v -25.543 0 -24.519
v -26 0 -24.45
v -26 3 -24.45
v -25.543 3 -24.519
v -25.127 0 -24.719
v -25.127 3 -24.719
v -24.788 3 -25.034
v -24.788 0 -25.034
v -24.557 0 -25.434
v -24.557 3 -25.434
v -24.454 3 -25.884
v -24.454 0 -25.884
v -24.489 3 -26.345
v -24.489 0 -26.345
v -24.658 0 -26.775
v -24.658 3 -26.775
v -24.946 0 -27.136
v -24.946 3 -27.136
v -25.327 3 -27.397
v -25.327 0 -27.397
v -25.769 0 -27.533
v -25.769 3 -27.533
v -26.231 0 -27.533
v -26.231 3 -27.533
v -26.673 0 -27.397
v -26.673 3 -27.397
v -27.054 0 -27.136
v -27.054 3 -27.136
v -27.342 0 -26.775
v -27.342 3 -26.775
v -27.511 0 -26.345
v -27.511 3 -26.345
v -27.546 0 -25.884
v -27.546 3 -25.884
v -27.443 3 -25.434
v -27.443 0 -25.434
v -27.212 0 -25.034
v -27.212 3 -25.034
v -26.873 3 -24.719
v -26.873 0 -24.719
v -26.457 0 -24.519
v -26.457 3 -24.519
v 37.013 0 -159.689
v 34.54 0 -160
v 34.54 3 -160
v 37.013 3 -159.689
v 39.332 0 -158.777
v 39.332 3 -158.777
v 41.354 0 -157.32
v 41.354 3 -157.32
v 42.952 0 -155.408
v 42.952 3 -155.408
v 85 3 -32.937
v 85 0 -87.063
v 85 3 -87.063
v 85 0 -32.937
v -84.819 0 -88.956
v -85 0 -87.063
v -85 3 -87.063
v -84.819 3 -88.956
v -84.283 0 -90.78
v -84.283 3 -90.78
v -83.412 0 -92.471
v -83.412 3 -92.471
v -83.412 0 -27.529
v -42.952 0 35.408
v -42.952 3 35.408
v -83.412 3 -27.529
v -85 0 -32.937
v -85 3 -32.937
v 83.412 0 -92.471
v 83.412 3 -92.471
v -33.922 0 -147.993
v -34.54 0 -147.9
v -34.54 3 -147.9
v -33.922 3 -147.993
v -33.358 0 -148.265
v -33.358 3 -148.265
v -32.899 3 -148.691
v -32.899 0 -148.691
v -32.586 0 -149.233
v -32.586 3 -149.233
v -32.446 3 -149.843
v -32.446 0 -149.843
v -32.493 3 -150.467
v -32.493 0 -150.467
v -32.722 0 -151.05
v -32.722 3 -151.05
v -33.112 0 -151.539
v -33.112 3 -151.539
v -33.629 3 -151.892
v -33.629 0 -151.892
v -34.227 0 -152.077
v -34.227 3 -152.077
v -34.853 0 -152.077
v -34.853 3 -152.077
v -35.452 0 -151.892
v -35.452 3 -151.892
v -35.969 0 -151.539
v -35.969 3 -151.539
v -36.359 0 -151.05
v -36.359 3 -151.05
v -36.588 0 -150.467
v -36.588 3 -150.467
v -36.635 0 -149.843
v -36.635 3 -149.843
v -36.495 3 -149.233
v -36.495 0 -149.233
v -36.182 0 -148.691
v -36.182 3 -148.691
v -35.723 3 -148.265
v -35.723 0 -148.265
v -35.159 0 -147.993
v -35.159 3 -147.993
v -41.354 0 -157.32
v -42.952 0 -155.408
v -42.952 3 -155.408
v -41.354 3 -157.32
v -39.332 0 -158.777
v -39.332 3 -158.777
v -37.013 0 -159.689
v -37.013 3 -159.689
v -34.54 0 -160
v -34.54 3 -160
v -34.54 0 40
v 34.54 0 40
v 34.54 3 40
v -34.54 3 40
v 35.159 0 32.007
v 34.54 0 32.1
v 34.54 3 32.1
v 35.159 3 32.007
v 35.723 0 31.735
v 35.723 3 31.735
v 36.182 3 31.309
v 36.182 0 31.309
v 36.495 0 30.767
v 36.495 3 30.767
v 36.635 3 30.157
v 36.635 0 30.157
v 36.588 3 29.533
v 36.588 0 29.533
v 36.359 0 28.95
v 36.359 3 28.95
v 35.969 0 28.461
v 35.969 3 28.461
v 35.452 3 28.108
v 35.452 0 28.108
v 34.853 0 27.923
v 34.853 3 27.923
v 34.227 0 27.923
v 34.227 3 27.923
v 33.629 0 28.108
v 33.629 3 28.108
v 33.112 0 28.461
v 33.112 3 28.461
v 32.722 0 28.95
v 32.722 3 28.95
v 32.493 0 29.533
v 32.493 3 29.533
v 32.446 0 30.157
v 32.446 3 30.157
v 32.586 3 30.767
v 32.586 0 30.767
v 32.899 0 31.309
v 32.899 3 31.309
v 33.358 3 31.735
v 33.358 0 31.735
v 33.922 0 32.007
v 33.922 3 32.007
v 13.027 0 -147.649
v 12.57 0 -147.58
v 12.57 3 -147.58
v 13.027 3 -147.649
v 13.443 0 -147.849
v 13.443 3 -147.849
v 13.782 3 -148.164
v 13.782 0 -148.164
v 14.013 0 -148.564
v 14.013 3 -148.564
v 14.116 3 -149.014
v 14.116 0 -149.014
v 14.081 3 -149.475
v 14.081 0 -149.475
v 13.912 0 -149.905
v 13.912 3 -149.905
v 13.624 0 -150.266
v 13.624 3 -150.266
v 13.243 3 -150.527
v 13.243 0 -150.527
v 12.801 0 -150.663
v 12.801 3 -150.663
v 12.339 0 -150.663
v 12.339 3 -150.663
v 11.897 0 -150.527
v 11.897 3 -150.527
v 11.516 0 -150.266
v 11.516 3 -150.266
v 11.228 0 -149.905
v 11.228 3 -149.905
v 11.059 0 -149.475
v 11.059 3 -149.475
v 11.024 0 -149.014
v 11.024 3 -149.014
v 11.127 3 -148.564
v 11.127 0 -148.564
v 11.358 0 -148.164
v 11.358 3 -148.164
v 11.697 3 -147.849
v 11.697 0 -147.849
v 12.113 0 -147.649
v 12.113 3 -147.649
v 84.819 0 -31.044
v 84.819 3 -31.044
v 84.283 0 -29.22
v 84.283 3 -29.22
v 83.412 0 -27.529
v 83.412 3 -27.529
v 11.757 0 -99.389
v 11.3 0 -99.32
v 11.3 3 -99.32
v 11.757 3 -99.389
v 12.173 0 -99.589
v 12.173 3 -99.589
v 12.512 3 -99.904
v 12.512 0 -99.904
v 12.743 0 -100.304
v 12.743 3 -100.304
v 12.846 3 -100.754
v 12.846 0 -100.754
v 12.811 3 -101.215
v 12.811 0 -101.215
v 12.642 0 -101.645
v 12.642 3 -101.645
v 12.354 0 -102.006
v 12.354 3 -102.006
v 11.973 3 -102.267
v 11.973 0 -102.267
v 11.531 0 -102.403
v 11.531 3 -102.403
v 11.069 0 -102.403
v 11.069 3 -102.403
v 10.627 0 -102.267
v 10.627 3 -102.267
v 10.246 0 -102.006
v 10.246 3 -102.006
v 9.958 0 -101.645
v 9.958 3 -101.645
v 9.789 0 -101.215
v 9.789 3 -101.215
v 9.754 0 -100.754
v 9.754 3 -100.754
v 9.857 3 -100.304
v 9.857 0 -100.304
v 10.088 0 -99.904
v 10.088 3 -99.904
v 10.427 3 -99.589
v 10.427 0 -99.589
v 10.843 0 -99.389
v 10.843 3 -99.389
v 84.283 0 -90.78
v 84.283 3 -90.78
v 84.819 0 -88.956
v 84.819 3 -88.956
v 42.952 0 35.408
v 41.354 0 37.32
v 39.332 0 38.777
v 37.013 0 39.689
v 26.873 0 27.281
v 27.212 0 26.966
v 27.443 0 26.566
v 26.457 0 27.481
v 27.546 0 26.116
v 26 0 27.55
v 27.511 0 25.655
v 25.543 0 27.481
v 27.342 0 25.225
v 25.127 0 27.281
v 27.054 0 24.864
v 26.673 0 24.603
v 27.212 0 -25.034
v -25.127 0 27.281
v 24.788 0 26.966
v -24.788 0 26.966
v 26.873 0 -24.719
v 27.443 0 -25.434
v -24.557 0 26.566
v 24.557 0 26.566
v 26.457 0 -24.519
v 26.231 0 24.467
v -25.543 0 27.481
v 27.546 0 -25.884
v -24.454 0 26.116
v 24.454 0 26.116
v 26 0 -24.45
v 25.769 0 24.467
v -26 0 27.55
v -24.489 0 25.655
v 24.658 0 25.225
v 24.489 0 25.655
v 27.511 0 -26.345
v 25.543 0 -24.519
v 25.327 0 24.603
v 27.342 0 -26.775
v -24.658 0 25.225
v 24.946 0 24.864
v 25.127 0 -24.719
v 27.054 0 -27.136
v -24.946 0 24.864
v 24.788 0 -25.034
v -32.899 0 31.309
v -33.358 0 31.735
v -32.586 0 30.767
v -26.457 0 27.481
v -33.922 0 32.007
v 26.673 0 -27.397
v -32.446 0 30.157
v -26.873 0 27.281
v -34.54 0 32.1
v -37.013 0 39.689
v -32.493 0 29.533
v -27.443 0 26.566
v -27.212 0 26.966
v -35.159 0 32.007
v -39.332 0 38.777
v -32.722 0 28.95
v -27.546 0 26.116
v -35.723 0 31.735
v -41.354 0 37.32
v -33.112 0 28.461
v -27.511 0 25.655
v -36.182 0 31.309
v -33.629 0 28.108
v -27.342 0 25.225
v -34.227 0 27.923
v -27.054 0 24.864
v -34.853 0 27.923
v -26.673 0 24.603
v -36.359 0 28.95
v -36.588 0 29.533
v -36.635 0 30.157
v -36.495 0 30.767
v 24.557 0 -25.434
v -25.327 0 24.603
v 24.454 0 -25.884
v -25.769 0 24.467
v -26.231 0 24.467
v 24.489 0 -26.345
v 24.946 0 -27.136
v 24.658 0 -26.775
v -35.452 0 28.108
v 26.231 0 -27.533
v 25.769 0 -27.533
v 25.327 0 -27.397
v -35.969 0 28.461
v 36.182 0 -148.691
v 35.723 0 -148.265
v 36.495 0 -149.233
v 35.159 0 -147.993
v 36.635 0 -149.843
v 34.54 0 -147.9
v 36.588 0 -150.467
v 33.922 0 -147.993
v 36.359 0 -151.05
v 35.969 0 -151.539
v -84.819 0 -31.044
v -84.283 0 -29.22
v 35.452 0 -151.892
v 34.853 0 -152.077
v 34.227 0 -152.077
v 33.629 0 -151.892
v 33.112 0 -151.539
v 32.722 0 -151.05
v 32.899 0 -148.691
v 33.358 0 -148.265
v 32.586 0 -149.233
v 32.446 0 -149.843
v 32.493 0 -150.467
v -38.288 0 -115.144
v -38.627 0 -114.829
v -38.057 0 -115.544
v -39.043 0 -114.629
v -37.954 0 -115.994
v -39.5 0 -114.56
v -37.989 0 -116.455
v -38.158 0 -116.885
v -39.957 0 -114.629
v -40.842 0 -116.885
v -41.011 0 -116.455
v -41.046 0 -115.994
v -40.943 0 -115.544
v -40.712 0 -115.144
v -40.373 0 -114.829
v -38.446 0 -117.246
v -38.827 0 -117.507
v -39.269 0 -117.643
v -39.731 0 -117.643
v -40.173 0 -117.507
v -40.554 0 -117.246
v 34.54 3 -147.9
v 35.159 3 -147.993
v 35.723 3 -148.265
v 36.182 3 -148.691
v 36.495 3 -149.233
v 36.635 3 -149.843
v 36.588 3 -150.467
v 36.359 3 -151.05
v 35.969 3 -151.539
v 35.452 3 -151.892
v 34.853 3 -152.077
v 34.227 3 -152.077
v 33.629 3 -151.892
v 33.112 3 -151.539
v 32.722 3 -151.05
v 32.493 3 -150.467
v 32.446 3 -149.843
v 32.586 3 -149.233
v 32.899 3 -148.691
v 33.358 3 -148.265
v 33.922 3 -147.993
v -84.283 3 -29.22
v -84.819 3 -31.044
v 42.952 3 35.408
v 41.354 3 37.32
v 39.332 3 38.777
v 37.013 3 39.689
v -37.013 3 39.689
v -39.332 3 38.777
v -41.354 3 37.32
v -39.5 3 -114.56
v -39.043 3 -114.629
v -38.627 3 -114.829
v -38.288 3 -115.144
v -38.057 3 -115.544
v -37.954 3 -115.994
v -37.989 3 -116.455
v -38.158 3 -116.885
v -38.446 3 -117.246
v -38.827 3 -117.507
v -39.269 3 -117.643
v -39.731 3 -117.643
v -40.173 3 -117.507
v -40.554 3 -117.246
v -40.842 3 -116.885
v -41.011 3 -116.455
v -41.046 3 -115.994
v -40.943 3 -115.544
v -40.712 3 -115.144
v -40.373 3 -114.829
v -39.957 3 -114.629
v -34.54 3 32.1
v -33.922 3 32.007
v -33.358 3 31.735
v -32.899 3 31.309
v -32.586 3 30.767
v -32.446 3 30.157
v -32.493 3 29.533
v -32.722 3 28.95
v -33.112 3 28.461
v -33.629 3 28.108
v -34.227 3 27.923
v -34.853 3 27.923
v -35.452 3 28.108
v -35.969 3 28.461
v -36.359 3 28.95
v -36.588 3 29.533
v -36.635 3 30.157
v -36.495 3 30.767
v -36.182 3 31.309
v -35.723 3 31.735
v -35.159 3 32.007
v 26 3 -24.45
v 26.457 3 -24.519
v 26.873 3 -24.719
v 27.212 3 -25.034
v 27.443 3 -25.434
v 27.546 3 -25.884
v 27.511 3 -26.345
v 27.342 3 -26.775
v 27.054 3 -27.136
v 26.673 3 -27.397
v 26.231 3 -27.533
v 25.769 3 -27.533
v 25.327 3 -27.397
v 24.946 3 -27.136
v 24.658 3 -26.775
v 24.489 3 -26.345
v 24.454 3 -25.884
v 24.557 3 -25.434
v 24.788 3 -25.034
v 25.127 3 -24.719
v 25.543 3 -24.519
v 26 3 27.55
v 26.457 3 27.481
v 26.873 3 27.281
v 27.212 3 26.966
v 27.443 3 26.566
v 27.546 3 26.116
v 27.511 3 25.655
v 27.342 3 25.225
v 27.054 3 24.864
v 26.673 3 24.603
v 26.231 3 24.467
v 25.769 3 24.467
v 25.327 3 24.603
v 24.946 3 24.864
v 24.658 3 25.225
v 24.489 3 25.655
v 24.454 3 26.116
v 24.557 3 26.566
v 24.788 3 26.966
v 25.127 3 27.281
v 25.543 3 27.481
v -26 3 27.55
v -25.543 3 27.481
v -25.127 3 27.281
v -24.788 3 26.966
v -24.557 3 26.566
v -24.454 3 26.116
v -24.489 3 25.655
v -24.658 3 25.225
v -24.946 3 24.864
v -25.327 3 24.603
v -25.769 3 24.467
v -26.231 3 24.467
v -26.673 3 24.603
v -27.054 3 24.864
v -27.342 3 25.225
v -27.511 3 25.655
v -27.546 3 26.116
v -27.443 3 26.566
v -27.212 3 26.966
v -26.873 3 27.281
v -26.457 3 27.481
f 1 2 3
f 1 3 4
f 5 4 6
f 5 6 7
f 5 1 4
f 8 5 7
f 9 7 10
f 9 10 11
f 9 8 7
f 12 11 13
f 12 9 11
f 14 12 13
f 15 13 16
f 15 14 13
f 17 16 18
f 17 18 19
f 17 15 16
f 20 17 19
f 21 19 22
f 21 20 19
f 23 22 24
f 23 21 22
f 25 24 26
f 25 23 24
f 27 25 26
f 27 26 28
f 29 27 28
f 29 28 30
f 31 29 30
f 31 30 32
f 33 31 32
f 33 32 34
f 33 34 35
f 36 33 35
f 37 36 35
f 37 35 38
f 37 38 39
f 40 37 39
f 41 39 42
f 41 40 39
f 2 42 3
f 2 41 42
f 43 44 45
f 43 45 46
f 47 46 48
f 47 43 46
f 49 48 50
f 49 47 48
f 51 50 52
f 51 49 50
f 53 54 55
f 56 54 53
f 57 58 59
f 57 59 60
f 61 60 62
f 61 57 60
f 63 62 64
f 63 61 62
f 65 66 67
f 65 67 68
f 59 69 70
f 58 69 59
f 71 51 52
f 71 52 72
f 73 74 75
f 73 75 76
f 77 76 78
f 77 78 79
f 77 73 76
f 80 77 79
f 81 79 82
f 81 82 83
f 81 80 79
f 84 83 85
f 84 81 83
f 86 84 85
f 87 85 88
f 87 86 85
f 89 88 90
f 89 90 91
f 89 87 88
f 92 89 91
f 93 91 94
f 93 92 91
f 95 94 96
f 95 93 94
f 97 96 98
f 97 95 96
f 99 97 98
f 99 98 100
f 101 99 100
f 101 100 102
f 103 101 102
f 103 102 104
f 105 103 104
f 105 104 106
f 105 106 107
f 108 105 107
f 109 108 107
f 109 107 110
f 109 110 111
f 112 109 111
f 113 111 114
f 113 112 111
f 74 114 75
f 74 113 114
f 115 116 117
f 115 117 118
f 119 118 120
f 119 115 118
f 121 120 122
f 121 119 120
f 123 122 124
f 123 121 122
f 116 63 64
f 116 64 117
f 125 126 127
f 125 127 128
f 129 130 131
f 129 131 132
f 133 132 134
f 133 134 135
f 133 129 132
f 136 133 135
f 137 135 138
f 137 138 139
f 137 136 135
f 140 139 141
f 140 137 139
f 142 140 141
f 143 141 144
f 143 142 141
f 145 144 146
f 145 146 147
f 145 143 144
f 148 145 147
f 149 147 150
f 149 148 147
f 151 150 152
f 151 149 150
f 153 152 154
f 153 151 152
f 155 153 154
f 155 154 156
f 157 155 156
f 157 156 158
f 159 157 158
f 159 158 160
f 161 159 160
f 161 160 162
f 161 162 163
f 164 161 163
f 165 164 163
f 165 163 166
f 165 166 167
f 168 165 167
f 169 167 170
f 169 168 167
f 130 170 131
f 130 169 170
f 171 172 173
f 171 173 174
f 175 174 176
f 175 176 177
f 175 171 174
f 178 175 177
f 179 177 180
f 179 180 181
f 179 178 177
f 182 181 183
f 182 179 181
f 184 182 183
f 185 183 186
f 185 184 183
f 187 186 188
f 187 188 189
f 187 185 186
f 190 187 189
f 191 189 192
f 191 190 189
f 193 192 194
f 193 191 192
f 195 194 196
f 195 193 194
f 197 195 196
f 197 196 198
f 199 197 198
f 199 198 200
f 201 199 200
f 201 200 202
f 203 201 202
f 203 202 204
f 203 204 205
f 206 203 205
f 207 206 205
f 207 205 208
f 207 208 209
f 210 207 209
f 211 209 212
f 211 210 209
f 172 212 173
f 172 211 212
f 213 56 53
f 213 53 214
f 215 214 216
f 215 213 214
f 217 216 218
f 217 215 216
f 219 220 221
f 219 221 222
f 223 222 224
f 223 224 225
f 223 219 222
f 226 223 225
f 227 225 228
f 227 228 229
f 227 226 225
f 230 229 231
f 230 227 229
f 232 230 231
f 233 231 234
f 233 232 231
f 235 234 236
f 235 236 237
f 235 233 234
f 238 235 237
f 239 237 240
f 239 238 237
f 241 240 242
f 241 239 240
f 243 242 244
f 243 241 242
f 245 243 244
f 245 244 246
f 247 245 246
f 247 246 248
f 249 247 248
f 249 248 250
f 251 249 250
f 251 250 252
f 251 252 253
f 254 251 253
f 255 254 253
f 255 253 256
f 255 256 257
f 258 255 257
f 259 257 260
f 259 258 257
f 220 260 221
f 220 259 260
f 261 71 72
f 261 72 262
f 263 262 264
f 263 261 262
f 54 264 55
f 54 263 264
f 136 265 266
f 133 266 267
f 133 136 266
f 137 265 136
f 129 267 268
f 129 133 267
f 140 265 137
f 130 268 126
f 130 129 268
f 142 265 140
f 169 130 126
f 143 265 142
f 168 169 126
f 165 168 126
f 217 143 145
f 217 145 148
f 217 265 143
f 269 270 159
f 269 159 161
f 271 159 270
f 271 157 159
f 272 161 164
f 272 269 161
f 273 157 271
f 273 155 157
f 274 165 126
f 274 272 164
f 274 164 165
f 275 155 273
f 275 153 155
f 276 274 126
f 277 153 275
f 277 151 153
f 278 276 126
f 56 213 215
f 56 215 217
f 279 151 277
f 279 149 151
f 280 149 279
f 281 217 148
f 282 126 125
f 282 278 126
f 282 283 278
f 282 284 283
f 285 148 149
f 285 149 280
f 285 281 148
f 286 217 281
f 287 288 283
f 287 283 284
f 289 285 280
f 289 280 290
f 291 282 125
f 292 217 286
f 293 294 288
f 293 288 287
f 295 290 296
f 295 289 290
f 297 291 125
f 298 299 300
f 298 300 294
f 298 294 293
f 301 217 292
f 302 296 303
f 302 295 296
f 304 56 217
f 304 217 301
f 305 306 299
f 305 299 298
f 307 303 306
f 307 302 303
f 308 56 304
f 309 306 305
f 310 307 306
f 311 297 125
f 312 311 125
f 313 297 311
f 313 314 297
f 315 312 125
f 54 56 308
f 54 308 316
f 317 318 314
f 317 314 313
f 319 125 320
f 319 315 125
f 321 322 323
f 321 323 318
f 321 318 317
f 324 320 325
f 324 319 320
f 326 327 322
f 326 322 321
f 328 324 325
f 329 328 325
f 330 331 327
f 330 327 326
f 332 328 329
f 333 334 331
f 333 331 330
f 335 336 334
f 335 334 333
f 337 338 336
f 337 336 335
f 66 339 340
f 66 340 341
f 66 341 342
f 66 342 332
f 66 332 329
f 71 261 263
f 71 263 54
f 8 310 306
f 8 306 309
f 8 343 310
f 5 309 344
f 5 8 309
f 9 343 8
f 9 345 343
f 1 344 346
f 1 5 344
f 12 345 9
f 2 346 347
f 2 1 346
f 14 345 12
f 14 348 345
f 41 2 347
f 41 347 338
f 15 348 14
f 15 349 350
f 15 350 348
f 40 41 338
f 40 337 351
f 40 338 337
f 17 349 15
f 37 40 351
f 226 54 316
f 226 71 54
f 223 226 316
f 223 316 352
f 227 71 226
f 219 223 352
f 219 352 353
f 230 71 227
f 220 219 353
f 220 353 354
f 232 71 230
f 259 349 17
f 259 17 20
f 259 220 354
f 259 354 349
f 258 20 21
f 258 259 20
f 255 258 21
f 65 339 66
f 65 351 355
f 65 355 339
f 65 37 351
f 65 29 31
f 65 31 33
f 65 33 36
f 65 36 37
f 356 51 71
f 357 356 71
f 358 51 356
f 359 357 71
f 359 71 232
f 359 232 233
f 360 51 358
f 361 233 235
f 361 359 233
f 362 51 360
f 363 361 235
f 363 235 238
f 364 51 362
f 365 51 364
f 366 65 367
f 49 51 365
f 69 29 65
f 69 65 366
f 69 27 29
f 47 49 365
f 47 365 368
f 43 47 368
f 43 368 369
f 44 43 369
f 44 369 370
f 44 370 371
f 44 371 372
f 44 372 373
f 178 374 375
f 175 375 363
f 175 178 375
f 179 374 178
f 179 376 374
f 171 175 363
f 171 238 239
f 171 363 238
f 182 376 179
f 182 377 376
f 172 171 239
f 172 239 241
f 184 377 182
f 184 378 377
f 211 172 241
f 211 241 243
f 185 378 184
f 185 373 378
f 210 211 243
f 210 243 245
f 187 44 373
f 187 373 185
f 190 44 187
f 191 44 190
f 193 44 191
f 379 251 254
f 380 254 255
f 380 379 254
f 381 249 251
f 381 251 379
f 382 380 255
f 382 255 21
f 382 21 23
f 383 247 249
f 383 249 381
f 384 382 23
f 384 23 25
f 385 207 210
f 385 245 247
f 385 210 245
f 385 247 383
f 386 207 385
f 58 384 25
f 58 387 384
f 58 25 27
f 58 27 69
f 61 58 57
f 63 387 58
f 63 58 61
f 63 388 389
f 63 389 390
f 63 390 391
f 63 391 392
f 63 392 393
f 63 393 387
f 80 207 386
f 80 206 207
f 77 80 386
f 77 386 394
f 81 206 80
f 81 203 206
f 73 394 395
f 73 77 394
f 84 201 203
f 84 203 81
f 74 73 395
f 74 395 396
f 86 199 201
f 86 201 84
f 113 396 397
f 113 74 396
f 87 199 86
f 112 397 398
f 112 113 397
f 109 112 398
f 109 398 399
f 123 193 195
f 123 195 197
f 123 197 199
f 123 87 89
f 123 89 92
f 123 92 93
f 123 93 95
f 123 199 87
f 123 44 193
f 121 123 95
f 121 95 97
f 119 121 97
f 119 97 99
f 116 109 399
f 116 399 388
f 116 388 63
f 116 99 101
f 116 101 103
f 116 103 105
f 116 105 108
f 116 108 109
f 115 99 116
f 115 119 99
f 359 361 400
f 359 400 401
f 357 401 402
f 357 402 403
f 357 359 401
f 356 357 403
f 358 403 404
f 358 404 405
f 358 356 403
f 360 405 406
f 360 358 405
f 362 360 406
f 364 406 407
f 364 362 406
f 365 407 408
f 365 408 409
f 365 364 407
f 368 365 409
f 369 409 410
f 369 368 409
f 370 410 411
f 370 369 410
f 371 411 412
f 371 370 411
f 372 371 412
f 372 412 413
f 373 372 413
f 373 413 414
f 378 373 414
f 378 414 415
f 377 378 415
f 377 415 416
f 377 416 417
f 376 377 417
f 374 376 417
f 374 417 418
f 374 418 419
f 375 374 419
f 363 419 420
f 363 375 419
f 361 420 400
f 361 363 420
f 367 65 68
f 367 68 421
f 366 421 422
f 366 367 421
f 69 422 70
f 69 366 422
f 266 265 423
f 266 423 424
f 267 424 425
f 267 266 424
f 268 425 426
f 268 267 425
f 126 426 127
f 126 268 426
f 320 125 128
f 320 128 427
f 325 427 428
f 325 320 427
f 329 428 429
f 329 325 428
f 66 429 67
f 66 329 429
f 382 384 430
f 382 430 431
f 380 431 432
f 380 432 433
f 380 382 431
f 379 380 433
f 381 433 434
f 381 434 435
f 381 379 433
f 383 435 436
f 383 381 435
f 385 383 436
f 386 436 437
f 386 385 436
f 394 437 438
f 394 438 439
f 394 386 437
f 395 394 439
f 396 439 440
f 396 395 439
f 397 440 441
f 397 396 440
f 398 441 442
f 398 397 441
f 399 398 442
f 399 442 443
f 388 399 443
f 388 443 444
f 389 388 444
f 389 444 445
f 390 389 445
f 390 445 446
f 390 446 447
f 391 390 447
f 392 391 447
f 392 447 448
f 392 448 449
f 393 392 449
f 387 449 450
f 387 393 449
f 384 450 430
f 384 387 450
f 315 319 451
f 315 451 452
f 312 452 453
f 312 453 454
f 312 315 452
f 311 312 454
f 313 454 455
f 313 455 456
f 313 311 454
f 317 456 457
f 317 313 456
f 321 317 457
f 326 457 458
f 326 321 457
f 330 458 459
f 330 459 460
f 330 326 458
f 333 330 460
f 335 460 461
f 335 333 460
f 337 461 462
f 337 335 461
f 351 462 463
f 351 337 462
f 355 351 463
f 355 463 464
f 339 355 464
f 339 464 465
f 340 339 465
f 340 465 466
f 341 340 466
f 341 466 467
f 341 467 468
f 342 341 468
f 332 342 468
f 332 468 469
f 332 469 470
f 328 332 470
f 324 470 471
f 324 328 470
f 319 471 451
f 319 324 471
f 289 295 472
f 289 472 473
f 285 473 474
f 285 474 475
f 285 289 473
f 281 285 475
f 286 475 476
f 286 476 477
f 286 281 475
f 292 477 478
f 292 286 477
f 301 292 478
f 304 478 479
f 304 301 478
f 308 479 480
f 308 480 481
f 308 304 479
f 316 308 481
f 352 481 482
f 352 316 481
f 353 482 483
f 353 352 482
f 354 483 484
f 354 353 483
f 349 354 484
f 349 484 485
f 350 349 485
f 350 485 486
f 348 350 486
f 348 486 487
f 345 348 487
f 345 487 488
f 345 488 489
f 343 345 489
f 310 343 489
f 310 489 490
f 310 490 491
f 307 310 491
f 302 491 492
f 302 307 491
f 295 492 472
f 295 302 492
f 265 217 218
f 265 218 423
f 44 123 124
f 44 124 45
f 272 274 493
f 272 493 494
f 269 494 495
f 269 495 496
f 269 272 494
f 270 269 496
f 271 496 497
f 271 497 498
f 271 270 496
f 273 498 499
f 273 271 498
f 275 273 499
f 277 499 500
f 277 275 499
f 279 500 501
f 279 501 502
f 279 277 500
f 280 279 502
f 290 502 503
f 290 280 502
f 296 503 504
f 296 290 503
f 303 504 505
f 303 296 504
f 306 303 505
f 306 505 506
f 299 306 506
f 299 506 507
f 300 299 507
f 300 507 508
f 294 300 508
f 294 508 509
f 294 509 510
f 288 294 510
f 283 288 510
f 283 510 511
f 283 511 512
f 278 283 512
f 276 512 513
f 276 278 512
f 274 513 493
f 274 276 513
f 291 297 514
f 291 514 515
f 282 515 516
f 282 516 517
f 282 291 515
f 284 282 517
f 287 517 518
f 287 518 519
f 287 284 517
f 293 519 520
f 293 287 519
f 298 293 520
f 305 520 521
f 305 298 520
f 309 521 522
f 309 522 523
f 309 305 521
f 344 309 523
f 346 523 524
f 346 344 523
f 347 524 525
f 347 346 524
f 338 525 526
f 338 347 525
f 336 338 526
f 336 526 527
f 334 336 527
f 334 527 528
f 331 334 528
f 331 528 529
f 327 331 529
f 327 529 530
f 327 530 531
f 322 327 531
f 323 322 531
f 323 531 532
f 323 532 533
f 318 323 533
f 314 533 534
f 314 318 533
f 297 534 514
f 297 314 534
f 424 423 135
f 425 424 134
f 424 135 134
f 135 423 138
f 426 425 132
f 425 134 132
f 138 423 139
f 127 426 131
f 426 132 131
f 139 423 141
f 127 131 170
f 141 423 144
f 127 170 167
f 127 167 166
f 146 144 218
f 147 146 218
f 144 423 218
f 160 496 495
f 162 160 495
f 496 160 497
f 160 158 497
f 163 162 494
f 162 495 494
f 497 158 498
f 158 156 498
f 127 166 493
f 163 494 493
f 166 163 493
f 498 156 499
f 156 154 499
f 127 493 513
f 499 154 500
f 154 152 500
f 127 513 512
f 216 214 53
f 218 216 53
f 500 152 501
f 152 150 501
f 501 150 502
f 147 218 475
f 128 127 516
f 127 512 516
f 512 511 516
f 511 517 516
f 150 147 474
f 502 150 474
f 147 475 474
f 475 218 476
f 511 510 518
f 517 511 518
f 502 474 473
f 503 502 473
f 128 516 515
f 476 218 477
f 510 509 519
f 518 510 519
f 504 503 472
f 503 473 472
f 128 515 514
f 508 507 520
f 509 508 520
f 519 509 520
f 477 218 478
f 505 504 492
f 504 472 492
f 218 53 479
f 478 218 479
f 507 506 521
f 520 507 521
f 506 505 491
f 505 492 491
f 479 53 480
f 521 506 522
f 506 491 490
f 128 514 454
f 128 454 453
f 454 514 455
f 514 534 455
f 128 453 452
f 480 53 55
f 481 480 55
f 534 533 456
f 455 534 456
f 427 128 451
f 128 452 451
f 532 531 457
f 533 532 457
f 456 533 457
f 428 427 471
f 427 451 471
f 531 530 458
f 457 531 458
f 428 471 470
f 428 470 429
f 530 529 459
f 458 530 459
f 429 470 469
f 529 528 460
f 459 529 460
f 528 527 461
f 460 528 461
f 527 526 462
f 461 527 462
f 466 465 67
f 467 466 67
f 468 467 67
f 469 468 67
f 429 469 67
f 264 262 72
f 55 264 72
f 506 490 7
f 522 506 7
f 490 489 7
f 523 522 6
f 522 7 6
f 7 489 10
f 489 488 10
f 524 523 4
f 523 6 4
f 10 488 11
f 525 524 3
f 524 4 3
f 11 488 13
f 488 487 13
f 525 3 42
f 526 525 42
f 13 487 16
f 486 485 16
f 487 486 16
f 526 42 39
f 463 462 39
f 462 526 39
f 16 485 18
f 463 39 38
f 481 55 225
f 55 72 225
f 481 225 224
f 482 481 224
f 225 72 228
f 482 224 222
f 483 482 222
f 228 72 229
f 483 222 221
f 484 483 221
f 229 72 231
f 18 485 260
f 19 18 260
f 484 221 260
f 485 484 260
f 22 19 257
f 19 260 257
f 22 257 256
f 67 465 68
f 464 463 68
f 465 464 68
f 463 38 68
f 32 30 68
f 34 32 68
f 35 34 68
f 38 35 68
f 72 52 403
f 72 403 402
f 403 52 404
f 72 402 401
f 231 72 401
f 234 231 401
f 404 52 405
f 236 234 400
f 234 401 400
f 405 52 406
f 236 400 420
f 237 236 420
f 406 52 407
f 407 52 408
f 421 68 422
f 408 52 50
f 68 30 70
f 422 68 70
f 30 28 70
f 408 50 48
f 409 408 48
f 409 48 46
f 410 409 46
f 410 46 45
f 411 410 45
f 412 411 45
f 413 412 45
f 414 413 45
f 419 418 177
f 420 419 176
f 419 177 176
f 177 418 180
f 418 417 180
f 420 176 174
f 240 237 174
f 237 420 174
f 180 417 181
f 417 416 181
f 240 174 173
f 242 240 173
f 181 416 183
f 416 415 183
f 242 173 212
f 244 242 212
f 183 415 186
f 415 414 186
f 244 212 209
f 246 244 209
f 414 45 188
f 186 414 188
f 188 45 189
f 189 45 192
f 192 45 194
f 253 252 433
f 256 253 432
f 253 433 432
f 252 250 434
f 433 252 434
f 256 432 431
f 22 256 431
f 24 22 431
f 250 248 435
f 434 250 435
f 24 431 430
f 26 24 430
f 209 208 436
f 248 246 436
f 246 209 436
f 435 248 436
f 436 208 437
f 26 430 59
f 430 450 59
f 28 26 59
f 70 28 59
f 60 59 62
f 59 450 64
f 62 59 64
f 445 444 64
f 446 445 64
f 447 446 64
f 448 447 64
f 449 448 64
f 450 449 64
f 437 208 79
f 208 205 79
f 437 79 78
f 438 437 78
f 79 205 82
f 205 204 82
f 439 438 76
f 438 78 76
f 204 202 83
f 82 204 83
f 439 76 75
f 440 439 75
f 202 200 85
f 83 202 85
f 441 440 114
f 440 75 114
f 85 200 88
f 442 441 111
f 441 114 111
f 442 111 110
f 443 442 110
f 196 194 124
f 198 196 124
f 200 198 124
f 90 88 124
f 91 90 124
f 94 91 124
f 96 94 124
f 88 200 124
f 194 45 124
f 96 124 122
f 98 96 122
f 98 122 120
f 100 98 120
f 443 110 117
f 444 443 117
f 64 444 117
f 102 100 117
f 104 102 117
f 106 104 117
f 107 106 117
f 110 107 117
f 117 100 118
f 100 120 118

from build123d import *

# Parameters (mm, degrees)
SKETCH_1_R      = 1.55
SKETCH_1_R_2    = 2.1
EXTRUDE_1_DEPTH = 3


with BuildPart() as part:
    # 草图1 → 凸台-拉伸1 (new body)
    with BuildSketch(Plane(origin=(0, 0, 0), x_dir=(1, 0, 0), z_dir=(0, 1, 0))):
        with BuildLine():
            Line((-85, 32.937018863), (-85, 87.062981137))
            ThreePointArc((-85, 87.062981137), (-84.594734169, 89.880972661), (-83.411784754, 92.47055705))
            Line((-83.411784754, 92.47055705), (-42.952272627, 155.407575913))
            ThreePointArc((-42.952272627, 155.407575913), (-39.332368552, 158.777122511), (-34.540487874, 160))
            Line((-34.540487874, 160), (34.540487874, 160))
            ThreePointArc((34.540487874, 160), (39.332368552, 158.777122511), (42.952272627, 155.407575913))
            Line((42.952272627, 155.407575913), (83.411784754, 92.47055705))
            ThreePointArc((83.411784754, 92.47055705), (84.594734169, 89.880972661), (85, 87.062981137))
            Line((85, 87.062981137), (85, 32.937018863))
            ThreePointArc((85, 32.937018863), (84.594734169, 30.119027339), (83.411784754, 27.52944295))
            Line((83.411784754, 27.52944295), (42.952272627, -35.407575913))
            ThreePointArc((42.952272627, -35.407575913), (39.332368552, -38.777122511), (34.540487874, -40))
            Line((34.540487874, -40), (-34.540487874, -40))
            ThreePointArc((-34.540487874, -40), (-39.332368552, -38.777122511), (-42.952272627, -35.407575913))
            Line((-42.952272627, -35.407575913), (-83.411784754, 27.52944295))
            ThreePointArc((-83.411784754, 27.52944295), (-84.594734169, 30.119027339), (-85, 32.937018863))
        make_face()
        with Locations(Location((-26, 26, 0), (0, 0, 270))):
            Circle(SKETCH_1_R, mode=Mode.SUBTRACT)
        with Locations(Location((26, 26, 0), (0, 0, 270))):
            Circle(SKETCH_1_R, mode=Mode.SUBTRACT)
        with Locations(Location((26, -26, 0), (0, 0, 270))):
            Circle(SKETCH_1_R, mode=Mode.SUBTRACT)
        with Locations(Location((-26, -26, 0), (0, 0, 270))):
            Circle(SKETCH_1_R, mode=Mode.SUBTRACT)
        with Locations(Location((-39.5, 116.11, 0), (0, 0, 270))):
            Circle(SKETCH_1_R, mode=Mode.SUBTRACT)
        with Locations(Location((11.3, 100.87, 0), (0, 0, 270))):
            Circle(SKETCH_1_R, mode=Mode.SUBTRACT)
        with Locations(Location((12.57, 149.13, 0), (0, 0, 270))):
            Circle(SKETCH_1_R, mode=Mode.SUBTRACT)
        with Locations(Location((-34.540487874, -30, 0), (0, 0, 270))):
            Circle(SKETCH_1_R_2, mode=Mode.SUBTRACT)
        with Locations(Location((34.540487874, -30, 0), (0, 0, 270))):
            Circle(SKETCH_1_R_2, mode=Mode.SUBTRACT)
        with Locations(Location((34.540487874, 150, 0), (0, 0, 270))):
            Circle(SKETCH_1_R_2, mode=Mode.SUBTRACT)
        with Locations(Location((-34.540487874, 150, 0), (0, 0, 270))):
            Circle(SKETCH_1_R_2, mode=Mode.SUBTRACT)
    extrude(amount=EXTRUDE_1_DEPTH)


solid = part.part
